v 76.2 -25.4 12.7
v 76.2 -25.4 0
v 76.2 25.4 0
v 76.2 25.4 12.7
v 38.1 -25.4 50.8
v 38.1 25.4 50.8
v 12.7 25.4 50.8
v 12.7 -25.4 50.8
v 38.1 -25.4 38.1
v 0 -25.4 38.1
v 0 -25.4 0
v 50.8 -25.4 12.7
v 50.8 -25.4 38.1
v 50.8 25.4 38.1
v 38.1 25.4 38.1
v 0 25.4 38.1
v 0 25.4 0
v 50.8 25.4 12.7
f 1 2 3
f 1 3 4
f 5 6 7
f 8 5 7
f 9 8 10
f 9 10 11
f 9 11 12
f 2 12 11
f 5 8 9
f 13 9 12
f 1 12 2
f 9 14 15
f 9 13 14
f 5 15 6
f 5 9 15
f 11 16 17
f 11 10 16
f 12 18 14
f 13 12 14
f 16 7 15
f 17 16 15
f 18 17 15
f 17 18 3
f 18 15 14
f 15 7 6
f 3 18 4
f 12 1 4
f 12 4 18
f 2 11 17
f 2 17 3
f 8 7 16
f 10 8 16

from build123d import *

# Parameters (mm, degrees)
F1_DEPTH = 25.4
F2_DEPTH = 25.4
F3_DEPTH = 12.7


# Not quite as in the source:
# - a feature names something its author has since deleted; it is built from what else it names


with BuildPart() as f1:
    # F0 (on Front) → F1 (new body, symmetric)
    with BuildSketch(Plane.XZ):
        Polygon((0, 38.1), (0, 0), (76.2, 0), (76.2, 12.7), (50.8, 12.7), (50.8, 25.4), (25.4, 25.4), (25.4, 50.8), (12.7, 50.8), align=None)
    extrude(amount=F1_DEPTH, both=True)

    # F0 (on Front) → F2 (join, symmetric)
    with BuildSketch(Plane.XZ):
        Polygon((38.1, 50.8), (25.4, 50.8), (25.4, 25.4), (50.8, 25.4), (50.8, 38.1), (38.1, 38.1), align=None)
    extrude(amount=F2_DEPTH, both=True)

    # F0 (on Front) → F3 (join, symmetric)
    with BuildSketch(Plane.XZ):
        Polygon((38.1, 50.8), (25.4, 50.8), (25.4, 25.4), (50.8, 25.4), (50.8, 38.1), (38.1, 38.1), align=None)
    extrude(amount=F3_DEPTH, both=True)


solid = f1.part
